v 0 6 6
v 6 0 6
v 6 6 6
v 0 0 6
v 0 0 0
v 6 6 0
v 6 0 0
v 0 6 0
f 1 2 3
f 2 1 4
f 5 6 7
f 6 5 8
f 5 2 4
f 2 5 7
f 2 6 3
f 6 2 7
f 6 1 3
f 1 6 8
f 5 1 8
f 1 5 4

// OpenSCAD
union() {
  translate([0, 0, 0]) cube(size=[6,6,6], center=false);
}
